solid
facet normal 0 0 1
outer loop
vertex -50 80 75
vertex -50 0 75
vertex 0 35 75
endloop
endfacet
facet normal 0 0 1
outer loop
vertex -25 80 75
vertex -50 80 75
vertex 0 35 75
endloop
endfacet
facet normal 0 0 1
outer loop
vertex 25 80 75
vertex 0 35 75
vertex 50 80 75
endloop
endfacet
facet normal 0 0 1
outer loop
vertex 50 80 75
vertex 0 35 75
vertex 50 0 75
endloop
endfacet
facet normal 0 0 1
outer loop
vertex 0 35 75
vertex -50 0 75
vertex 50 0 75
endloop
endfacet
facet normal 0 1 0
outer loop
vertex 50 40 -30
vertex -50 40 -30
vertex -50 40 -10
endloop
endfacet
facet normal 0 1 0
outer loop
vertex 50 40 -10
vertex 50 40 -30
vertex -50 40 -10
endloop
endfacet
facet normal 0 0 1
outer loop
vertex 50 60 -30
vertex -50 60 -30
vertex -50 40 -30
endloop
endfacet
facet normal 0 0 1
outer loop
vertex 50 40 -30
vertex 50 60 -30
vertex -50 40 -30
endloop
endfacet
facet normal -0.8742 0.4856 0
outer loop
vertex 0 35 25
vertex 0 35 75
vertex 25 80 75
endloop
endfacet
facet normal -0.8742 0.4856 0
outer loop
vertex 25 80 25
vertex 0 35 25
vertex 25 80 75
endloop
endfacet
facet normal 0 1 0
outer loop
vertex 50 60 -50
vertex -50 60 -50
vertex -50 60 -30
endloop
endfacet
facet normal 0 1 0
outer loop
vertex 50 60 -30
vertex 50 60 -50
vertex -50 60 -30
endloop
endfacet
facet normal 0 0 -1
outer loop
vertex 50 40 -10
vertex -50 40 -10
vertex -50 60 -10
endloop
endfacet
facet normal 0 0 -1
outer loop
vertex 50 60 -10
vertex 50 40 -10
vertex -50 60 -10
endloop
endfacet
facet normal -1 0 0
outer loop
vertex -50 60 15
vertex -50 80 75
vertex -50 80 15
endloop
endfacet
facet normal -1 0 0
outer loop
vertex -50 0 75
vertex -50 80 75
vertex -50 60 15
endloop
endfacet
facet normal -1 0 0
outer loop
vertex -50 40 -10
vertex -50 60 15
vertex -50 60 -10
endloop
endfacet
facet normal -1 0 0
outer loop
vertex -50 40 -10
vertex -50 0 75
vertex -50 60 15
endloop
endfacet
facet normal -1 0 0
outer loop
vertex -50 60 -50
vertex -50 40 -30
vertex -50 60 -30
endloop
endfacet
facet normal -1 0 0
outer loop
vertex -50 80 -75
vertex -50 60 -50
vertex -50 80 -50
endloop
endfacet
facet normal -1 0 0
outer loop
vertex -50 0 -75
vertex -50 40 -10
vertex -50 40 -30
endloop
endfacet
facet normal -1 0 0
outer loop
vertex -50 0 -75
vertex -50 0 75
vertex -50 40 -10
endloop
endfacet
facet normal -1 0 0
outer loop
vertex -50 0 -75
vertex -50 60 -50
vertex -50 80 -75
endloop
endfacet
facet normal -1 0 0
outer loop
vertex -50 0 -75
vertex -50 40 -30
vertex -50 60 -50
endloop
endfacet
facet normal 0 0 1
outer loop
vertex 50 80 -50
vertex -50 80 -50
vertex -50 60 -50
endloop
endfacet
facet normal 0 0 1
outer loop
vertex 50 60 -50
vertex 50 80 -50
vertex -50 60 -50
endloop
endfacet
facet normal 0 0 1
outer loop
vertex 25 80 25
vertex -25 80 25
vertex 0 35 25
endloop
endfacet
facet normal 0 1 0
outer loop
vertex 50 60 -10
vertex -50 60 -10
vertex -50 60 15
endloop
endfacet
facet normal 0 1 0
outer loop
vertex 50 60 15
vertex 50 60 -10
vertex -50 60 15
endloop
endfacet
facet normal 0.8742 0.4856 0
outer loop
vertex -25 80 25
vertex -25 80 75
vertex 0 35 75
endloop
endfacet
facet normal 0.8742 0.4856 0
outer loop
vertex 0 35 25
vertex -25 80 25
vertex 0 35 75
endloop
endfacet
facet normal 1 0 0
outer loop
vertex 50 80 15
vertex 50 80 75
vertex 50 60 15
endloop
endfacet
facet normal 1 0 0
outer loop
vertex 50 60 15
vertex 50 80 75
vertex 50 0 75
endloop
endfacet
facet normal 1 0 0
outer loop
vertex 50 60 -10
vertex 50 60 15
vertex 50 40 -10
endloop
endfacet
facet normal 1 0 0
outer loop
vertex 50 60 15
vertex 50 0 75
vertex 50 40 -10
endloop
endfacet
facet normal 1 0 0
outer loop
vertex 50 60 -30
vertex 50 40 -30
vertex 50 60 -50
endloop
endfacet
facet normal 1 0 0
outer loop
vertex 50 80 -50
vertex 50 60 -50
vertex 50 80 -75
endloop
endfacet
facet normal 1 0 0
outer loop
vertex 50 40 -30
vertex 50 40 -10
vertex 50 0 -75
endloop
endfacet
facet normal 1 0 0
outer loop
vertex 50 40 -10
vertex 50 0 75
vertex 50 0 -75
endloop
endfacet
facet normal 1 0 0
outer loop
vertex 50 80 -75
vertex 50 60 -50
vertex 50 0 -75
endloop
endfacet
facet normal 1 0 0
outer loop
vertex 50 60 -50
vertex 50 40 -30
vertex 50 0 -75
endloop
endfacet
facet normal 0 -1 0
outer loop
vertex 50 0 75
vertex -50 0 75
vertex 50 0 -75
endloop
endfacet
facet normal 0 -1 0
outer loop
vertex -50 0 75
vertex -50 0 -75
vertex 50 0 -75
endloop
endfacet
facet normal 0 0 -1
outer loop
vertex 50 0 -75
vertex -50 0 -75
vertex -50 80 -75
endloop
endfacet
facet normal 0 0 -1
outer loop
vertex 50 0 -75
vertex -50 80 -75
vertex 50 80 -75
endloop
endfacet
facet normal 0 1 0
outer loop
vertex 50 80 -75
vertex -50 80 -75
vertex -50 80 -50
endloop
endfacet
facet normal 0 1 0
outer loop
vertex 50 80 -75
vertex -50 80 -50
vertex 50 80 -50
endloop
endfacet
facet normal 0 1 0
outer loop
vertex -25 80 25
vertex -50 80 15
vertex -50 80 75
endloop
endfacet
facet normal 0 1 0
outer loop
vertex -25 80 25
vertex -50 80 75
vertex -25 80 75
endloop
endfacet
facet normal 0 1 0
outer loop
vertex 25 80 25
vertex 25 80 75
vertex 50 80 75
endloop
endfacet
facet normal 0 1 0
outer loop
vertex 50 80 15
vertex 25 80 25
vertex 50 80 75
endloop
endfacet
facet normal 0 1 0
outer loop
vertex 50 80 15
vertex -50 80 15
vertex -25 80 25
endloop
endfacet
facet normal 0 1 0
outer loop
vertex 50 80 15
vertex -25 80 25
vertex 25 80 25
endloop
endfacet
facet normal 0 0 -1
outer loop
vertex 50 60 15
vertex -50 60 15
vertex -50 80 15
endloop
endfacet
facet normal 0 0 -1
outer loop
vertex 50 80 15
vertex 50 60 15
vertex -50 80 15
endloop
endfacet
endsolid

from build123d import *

# Parameters (mm, degrees)
SKETCH1_W           = 100
SKETCH1_H           = 150
BOSS_EXTRUDE1_DEPTH = 80
SKETCH2_OUTSIDE_W   = 141.446
SKETCH2_OUTSIDE_H   = 121.446
CUT_EXTRUDE2_DEPTH  = 50
SKETCH4_OUTSIDE_W   = 191.446
SKETCH4_OUTSIDE_H   = 121.446
CUT_EXTRUDE3_DEPTH  = 100


with BuildPart() as part:
    # Sketch1 → Boss-Extrude1 (new body)
    with BuildSketch(Plane(origin=(0, 0, 0), x_dir=(1, 0, 0), z_dir=(0, 1, 0))):
        Rectangle(SKETCH1_W, SKETCH1_H)
    extrude(amount=BOSS_EXTRUDE1_DEPTH)

    # Sketch2 outside → Cut-Extrude2 (cut)
    with BuildSketch(Plane.XY.offset(75)):
        with Locations((0, 40)):
            Rectangle(SKETCH2_OUTSIDE_W, SKETCH2_OUTSIDE_H)
        Polygon((50, 0), (-50, 0), (-50, 80), (-25, 80), (0, 35), (25, 80), (50, 80), align=None, mode=Mode.SUBTRACT)
    extrude(amount=-CUT_EXTRUDE2_DEPTH, mode=Mode.SUBTRACT)

    # Sketch4 outside → Cut-Extrude3 (cut)
    with BuildSketch(Plane.ZY.offset(50)):
        with Locations((0, 40)):
            Rectangle(SKETCH4_OUTSIDE_W, SKETCH4_OUTSIDE_H)
        Polygon((-75, 80), (-50, 80), (-50, 60), (-30, 60), (-30, 40), (-10, 40), (-10, 60), (15, 60), (15, 80), (75, 80), (75, 0), (-75, 0), align=None, mode=Mode.SUBTRACT)
    extrude(amount=-CUT_EXTRUDE3_DEPTH, mode=Mode.SUBTRACT)


solid = part.part
